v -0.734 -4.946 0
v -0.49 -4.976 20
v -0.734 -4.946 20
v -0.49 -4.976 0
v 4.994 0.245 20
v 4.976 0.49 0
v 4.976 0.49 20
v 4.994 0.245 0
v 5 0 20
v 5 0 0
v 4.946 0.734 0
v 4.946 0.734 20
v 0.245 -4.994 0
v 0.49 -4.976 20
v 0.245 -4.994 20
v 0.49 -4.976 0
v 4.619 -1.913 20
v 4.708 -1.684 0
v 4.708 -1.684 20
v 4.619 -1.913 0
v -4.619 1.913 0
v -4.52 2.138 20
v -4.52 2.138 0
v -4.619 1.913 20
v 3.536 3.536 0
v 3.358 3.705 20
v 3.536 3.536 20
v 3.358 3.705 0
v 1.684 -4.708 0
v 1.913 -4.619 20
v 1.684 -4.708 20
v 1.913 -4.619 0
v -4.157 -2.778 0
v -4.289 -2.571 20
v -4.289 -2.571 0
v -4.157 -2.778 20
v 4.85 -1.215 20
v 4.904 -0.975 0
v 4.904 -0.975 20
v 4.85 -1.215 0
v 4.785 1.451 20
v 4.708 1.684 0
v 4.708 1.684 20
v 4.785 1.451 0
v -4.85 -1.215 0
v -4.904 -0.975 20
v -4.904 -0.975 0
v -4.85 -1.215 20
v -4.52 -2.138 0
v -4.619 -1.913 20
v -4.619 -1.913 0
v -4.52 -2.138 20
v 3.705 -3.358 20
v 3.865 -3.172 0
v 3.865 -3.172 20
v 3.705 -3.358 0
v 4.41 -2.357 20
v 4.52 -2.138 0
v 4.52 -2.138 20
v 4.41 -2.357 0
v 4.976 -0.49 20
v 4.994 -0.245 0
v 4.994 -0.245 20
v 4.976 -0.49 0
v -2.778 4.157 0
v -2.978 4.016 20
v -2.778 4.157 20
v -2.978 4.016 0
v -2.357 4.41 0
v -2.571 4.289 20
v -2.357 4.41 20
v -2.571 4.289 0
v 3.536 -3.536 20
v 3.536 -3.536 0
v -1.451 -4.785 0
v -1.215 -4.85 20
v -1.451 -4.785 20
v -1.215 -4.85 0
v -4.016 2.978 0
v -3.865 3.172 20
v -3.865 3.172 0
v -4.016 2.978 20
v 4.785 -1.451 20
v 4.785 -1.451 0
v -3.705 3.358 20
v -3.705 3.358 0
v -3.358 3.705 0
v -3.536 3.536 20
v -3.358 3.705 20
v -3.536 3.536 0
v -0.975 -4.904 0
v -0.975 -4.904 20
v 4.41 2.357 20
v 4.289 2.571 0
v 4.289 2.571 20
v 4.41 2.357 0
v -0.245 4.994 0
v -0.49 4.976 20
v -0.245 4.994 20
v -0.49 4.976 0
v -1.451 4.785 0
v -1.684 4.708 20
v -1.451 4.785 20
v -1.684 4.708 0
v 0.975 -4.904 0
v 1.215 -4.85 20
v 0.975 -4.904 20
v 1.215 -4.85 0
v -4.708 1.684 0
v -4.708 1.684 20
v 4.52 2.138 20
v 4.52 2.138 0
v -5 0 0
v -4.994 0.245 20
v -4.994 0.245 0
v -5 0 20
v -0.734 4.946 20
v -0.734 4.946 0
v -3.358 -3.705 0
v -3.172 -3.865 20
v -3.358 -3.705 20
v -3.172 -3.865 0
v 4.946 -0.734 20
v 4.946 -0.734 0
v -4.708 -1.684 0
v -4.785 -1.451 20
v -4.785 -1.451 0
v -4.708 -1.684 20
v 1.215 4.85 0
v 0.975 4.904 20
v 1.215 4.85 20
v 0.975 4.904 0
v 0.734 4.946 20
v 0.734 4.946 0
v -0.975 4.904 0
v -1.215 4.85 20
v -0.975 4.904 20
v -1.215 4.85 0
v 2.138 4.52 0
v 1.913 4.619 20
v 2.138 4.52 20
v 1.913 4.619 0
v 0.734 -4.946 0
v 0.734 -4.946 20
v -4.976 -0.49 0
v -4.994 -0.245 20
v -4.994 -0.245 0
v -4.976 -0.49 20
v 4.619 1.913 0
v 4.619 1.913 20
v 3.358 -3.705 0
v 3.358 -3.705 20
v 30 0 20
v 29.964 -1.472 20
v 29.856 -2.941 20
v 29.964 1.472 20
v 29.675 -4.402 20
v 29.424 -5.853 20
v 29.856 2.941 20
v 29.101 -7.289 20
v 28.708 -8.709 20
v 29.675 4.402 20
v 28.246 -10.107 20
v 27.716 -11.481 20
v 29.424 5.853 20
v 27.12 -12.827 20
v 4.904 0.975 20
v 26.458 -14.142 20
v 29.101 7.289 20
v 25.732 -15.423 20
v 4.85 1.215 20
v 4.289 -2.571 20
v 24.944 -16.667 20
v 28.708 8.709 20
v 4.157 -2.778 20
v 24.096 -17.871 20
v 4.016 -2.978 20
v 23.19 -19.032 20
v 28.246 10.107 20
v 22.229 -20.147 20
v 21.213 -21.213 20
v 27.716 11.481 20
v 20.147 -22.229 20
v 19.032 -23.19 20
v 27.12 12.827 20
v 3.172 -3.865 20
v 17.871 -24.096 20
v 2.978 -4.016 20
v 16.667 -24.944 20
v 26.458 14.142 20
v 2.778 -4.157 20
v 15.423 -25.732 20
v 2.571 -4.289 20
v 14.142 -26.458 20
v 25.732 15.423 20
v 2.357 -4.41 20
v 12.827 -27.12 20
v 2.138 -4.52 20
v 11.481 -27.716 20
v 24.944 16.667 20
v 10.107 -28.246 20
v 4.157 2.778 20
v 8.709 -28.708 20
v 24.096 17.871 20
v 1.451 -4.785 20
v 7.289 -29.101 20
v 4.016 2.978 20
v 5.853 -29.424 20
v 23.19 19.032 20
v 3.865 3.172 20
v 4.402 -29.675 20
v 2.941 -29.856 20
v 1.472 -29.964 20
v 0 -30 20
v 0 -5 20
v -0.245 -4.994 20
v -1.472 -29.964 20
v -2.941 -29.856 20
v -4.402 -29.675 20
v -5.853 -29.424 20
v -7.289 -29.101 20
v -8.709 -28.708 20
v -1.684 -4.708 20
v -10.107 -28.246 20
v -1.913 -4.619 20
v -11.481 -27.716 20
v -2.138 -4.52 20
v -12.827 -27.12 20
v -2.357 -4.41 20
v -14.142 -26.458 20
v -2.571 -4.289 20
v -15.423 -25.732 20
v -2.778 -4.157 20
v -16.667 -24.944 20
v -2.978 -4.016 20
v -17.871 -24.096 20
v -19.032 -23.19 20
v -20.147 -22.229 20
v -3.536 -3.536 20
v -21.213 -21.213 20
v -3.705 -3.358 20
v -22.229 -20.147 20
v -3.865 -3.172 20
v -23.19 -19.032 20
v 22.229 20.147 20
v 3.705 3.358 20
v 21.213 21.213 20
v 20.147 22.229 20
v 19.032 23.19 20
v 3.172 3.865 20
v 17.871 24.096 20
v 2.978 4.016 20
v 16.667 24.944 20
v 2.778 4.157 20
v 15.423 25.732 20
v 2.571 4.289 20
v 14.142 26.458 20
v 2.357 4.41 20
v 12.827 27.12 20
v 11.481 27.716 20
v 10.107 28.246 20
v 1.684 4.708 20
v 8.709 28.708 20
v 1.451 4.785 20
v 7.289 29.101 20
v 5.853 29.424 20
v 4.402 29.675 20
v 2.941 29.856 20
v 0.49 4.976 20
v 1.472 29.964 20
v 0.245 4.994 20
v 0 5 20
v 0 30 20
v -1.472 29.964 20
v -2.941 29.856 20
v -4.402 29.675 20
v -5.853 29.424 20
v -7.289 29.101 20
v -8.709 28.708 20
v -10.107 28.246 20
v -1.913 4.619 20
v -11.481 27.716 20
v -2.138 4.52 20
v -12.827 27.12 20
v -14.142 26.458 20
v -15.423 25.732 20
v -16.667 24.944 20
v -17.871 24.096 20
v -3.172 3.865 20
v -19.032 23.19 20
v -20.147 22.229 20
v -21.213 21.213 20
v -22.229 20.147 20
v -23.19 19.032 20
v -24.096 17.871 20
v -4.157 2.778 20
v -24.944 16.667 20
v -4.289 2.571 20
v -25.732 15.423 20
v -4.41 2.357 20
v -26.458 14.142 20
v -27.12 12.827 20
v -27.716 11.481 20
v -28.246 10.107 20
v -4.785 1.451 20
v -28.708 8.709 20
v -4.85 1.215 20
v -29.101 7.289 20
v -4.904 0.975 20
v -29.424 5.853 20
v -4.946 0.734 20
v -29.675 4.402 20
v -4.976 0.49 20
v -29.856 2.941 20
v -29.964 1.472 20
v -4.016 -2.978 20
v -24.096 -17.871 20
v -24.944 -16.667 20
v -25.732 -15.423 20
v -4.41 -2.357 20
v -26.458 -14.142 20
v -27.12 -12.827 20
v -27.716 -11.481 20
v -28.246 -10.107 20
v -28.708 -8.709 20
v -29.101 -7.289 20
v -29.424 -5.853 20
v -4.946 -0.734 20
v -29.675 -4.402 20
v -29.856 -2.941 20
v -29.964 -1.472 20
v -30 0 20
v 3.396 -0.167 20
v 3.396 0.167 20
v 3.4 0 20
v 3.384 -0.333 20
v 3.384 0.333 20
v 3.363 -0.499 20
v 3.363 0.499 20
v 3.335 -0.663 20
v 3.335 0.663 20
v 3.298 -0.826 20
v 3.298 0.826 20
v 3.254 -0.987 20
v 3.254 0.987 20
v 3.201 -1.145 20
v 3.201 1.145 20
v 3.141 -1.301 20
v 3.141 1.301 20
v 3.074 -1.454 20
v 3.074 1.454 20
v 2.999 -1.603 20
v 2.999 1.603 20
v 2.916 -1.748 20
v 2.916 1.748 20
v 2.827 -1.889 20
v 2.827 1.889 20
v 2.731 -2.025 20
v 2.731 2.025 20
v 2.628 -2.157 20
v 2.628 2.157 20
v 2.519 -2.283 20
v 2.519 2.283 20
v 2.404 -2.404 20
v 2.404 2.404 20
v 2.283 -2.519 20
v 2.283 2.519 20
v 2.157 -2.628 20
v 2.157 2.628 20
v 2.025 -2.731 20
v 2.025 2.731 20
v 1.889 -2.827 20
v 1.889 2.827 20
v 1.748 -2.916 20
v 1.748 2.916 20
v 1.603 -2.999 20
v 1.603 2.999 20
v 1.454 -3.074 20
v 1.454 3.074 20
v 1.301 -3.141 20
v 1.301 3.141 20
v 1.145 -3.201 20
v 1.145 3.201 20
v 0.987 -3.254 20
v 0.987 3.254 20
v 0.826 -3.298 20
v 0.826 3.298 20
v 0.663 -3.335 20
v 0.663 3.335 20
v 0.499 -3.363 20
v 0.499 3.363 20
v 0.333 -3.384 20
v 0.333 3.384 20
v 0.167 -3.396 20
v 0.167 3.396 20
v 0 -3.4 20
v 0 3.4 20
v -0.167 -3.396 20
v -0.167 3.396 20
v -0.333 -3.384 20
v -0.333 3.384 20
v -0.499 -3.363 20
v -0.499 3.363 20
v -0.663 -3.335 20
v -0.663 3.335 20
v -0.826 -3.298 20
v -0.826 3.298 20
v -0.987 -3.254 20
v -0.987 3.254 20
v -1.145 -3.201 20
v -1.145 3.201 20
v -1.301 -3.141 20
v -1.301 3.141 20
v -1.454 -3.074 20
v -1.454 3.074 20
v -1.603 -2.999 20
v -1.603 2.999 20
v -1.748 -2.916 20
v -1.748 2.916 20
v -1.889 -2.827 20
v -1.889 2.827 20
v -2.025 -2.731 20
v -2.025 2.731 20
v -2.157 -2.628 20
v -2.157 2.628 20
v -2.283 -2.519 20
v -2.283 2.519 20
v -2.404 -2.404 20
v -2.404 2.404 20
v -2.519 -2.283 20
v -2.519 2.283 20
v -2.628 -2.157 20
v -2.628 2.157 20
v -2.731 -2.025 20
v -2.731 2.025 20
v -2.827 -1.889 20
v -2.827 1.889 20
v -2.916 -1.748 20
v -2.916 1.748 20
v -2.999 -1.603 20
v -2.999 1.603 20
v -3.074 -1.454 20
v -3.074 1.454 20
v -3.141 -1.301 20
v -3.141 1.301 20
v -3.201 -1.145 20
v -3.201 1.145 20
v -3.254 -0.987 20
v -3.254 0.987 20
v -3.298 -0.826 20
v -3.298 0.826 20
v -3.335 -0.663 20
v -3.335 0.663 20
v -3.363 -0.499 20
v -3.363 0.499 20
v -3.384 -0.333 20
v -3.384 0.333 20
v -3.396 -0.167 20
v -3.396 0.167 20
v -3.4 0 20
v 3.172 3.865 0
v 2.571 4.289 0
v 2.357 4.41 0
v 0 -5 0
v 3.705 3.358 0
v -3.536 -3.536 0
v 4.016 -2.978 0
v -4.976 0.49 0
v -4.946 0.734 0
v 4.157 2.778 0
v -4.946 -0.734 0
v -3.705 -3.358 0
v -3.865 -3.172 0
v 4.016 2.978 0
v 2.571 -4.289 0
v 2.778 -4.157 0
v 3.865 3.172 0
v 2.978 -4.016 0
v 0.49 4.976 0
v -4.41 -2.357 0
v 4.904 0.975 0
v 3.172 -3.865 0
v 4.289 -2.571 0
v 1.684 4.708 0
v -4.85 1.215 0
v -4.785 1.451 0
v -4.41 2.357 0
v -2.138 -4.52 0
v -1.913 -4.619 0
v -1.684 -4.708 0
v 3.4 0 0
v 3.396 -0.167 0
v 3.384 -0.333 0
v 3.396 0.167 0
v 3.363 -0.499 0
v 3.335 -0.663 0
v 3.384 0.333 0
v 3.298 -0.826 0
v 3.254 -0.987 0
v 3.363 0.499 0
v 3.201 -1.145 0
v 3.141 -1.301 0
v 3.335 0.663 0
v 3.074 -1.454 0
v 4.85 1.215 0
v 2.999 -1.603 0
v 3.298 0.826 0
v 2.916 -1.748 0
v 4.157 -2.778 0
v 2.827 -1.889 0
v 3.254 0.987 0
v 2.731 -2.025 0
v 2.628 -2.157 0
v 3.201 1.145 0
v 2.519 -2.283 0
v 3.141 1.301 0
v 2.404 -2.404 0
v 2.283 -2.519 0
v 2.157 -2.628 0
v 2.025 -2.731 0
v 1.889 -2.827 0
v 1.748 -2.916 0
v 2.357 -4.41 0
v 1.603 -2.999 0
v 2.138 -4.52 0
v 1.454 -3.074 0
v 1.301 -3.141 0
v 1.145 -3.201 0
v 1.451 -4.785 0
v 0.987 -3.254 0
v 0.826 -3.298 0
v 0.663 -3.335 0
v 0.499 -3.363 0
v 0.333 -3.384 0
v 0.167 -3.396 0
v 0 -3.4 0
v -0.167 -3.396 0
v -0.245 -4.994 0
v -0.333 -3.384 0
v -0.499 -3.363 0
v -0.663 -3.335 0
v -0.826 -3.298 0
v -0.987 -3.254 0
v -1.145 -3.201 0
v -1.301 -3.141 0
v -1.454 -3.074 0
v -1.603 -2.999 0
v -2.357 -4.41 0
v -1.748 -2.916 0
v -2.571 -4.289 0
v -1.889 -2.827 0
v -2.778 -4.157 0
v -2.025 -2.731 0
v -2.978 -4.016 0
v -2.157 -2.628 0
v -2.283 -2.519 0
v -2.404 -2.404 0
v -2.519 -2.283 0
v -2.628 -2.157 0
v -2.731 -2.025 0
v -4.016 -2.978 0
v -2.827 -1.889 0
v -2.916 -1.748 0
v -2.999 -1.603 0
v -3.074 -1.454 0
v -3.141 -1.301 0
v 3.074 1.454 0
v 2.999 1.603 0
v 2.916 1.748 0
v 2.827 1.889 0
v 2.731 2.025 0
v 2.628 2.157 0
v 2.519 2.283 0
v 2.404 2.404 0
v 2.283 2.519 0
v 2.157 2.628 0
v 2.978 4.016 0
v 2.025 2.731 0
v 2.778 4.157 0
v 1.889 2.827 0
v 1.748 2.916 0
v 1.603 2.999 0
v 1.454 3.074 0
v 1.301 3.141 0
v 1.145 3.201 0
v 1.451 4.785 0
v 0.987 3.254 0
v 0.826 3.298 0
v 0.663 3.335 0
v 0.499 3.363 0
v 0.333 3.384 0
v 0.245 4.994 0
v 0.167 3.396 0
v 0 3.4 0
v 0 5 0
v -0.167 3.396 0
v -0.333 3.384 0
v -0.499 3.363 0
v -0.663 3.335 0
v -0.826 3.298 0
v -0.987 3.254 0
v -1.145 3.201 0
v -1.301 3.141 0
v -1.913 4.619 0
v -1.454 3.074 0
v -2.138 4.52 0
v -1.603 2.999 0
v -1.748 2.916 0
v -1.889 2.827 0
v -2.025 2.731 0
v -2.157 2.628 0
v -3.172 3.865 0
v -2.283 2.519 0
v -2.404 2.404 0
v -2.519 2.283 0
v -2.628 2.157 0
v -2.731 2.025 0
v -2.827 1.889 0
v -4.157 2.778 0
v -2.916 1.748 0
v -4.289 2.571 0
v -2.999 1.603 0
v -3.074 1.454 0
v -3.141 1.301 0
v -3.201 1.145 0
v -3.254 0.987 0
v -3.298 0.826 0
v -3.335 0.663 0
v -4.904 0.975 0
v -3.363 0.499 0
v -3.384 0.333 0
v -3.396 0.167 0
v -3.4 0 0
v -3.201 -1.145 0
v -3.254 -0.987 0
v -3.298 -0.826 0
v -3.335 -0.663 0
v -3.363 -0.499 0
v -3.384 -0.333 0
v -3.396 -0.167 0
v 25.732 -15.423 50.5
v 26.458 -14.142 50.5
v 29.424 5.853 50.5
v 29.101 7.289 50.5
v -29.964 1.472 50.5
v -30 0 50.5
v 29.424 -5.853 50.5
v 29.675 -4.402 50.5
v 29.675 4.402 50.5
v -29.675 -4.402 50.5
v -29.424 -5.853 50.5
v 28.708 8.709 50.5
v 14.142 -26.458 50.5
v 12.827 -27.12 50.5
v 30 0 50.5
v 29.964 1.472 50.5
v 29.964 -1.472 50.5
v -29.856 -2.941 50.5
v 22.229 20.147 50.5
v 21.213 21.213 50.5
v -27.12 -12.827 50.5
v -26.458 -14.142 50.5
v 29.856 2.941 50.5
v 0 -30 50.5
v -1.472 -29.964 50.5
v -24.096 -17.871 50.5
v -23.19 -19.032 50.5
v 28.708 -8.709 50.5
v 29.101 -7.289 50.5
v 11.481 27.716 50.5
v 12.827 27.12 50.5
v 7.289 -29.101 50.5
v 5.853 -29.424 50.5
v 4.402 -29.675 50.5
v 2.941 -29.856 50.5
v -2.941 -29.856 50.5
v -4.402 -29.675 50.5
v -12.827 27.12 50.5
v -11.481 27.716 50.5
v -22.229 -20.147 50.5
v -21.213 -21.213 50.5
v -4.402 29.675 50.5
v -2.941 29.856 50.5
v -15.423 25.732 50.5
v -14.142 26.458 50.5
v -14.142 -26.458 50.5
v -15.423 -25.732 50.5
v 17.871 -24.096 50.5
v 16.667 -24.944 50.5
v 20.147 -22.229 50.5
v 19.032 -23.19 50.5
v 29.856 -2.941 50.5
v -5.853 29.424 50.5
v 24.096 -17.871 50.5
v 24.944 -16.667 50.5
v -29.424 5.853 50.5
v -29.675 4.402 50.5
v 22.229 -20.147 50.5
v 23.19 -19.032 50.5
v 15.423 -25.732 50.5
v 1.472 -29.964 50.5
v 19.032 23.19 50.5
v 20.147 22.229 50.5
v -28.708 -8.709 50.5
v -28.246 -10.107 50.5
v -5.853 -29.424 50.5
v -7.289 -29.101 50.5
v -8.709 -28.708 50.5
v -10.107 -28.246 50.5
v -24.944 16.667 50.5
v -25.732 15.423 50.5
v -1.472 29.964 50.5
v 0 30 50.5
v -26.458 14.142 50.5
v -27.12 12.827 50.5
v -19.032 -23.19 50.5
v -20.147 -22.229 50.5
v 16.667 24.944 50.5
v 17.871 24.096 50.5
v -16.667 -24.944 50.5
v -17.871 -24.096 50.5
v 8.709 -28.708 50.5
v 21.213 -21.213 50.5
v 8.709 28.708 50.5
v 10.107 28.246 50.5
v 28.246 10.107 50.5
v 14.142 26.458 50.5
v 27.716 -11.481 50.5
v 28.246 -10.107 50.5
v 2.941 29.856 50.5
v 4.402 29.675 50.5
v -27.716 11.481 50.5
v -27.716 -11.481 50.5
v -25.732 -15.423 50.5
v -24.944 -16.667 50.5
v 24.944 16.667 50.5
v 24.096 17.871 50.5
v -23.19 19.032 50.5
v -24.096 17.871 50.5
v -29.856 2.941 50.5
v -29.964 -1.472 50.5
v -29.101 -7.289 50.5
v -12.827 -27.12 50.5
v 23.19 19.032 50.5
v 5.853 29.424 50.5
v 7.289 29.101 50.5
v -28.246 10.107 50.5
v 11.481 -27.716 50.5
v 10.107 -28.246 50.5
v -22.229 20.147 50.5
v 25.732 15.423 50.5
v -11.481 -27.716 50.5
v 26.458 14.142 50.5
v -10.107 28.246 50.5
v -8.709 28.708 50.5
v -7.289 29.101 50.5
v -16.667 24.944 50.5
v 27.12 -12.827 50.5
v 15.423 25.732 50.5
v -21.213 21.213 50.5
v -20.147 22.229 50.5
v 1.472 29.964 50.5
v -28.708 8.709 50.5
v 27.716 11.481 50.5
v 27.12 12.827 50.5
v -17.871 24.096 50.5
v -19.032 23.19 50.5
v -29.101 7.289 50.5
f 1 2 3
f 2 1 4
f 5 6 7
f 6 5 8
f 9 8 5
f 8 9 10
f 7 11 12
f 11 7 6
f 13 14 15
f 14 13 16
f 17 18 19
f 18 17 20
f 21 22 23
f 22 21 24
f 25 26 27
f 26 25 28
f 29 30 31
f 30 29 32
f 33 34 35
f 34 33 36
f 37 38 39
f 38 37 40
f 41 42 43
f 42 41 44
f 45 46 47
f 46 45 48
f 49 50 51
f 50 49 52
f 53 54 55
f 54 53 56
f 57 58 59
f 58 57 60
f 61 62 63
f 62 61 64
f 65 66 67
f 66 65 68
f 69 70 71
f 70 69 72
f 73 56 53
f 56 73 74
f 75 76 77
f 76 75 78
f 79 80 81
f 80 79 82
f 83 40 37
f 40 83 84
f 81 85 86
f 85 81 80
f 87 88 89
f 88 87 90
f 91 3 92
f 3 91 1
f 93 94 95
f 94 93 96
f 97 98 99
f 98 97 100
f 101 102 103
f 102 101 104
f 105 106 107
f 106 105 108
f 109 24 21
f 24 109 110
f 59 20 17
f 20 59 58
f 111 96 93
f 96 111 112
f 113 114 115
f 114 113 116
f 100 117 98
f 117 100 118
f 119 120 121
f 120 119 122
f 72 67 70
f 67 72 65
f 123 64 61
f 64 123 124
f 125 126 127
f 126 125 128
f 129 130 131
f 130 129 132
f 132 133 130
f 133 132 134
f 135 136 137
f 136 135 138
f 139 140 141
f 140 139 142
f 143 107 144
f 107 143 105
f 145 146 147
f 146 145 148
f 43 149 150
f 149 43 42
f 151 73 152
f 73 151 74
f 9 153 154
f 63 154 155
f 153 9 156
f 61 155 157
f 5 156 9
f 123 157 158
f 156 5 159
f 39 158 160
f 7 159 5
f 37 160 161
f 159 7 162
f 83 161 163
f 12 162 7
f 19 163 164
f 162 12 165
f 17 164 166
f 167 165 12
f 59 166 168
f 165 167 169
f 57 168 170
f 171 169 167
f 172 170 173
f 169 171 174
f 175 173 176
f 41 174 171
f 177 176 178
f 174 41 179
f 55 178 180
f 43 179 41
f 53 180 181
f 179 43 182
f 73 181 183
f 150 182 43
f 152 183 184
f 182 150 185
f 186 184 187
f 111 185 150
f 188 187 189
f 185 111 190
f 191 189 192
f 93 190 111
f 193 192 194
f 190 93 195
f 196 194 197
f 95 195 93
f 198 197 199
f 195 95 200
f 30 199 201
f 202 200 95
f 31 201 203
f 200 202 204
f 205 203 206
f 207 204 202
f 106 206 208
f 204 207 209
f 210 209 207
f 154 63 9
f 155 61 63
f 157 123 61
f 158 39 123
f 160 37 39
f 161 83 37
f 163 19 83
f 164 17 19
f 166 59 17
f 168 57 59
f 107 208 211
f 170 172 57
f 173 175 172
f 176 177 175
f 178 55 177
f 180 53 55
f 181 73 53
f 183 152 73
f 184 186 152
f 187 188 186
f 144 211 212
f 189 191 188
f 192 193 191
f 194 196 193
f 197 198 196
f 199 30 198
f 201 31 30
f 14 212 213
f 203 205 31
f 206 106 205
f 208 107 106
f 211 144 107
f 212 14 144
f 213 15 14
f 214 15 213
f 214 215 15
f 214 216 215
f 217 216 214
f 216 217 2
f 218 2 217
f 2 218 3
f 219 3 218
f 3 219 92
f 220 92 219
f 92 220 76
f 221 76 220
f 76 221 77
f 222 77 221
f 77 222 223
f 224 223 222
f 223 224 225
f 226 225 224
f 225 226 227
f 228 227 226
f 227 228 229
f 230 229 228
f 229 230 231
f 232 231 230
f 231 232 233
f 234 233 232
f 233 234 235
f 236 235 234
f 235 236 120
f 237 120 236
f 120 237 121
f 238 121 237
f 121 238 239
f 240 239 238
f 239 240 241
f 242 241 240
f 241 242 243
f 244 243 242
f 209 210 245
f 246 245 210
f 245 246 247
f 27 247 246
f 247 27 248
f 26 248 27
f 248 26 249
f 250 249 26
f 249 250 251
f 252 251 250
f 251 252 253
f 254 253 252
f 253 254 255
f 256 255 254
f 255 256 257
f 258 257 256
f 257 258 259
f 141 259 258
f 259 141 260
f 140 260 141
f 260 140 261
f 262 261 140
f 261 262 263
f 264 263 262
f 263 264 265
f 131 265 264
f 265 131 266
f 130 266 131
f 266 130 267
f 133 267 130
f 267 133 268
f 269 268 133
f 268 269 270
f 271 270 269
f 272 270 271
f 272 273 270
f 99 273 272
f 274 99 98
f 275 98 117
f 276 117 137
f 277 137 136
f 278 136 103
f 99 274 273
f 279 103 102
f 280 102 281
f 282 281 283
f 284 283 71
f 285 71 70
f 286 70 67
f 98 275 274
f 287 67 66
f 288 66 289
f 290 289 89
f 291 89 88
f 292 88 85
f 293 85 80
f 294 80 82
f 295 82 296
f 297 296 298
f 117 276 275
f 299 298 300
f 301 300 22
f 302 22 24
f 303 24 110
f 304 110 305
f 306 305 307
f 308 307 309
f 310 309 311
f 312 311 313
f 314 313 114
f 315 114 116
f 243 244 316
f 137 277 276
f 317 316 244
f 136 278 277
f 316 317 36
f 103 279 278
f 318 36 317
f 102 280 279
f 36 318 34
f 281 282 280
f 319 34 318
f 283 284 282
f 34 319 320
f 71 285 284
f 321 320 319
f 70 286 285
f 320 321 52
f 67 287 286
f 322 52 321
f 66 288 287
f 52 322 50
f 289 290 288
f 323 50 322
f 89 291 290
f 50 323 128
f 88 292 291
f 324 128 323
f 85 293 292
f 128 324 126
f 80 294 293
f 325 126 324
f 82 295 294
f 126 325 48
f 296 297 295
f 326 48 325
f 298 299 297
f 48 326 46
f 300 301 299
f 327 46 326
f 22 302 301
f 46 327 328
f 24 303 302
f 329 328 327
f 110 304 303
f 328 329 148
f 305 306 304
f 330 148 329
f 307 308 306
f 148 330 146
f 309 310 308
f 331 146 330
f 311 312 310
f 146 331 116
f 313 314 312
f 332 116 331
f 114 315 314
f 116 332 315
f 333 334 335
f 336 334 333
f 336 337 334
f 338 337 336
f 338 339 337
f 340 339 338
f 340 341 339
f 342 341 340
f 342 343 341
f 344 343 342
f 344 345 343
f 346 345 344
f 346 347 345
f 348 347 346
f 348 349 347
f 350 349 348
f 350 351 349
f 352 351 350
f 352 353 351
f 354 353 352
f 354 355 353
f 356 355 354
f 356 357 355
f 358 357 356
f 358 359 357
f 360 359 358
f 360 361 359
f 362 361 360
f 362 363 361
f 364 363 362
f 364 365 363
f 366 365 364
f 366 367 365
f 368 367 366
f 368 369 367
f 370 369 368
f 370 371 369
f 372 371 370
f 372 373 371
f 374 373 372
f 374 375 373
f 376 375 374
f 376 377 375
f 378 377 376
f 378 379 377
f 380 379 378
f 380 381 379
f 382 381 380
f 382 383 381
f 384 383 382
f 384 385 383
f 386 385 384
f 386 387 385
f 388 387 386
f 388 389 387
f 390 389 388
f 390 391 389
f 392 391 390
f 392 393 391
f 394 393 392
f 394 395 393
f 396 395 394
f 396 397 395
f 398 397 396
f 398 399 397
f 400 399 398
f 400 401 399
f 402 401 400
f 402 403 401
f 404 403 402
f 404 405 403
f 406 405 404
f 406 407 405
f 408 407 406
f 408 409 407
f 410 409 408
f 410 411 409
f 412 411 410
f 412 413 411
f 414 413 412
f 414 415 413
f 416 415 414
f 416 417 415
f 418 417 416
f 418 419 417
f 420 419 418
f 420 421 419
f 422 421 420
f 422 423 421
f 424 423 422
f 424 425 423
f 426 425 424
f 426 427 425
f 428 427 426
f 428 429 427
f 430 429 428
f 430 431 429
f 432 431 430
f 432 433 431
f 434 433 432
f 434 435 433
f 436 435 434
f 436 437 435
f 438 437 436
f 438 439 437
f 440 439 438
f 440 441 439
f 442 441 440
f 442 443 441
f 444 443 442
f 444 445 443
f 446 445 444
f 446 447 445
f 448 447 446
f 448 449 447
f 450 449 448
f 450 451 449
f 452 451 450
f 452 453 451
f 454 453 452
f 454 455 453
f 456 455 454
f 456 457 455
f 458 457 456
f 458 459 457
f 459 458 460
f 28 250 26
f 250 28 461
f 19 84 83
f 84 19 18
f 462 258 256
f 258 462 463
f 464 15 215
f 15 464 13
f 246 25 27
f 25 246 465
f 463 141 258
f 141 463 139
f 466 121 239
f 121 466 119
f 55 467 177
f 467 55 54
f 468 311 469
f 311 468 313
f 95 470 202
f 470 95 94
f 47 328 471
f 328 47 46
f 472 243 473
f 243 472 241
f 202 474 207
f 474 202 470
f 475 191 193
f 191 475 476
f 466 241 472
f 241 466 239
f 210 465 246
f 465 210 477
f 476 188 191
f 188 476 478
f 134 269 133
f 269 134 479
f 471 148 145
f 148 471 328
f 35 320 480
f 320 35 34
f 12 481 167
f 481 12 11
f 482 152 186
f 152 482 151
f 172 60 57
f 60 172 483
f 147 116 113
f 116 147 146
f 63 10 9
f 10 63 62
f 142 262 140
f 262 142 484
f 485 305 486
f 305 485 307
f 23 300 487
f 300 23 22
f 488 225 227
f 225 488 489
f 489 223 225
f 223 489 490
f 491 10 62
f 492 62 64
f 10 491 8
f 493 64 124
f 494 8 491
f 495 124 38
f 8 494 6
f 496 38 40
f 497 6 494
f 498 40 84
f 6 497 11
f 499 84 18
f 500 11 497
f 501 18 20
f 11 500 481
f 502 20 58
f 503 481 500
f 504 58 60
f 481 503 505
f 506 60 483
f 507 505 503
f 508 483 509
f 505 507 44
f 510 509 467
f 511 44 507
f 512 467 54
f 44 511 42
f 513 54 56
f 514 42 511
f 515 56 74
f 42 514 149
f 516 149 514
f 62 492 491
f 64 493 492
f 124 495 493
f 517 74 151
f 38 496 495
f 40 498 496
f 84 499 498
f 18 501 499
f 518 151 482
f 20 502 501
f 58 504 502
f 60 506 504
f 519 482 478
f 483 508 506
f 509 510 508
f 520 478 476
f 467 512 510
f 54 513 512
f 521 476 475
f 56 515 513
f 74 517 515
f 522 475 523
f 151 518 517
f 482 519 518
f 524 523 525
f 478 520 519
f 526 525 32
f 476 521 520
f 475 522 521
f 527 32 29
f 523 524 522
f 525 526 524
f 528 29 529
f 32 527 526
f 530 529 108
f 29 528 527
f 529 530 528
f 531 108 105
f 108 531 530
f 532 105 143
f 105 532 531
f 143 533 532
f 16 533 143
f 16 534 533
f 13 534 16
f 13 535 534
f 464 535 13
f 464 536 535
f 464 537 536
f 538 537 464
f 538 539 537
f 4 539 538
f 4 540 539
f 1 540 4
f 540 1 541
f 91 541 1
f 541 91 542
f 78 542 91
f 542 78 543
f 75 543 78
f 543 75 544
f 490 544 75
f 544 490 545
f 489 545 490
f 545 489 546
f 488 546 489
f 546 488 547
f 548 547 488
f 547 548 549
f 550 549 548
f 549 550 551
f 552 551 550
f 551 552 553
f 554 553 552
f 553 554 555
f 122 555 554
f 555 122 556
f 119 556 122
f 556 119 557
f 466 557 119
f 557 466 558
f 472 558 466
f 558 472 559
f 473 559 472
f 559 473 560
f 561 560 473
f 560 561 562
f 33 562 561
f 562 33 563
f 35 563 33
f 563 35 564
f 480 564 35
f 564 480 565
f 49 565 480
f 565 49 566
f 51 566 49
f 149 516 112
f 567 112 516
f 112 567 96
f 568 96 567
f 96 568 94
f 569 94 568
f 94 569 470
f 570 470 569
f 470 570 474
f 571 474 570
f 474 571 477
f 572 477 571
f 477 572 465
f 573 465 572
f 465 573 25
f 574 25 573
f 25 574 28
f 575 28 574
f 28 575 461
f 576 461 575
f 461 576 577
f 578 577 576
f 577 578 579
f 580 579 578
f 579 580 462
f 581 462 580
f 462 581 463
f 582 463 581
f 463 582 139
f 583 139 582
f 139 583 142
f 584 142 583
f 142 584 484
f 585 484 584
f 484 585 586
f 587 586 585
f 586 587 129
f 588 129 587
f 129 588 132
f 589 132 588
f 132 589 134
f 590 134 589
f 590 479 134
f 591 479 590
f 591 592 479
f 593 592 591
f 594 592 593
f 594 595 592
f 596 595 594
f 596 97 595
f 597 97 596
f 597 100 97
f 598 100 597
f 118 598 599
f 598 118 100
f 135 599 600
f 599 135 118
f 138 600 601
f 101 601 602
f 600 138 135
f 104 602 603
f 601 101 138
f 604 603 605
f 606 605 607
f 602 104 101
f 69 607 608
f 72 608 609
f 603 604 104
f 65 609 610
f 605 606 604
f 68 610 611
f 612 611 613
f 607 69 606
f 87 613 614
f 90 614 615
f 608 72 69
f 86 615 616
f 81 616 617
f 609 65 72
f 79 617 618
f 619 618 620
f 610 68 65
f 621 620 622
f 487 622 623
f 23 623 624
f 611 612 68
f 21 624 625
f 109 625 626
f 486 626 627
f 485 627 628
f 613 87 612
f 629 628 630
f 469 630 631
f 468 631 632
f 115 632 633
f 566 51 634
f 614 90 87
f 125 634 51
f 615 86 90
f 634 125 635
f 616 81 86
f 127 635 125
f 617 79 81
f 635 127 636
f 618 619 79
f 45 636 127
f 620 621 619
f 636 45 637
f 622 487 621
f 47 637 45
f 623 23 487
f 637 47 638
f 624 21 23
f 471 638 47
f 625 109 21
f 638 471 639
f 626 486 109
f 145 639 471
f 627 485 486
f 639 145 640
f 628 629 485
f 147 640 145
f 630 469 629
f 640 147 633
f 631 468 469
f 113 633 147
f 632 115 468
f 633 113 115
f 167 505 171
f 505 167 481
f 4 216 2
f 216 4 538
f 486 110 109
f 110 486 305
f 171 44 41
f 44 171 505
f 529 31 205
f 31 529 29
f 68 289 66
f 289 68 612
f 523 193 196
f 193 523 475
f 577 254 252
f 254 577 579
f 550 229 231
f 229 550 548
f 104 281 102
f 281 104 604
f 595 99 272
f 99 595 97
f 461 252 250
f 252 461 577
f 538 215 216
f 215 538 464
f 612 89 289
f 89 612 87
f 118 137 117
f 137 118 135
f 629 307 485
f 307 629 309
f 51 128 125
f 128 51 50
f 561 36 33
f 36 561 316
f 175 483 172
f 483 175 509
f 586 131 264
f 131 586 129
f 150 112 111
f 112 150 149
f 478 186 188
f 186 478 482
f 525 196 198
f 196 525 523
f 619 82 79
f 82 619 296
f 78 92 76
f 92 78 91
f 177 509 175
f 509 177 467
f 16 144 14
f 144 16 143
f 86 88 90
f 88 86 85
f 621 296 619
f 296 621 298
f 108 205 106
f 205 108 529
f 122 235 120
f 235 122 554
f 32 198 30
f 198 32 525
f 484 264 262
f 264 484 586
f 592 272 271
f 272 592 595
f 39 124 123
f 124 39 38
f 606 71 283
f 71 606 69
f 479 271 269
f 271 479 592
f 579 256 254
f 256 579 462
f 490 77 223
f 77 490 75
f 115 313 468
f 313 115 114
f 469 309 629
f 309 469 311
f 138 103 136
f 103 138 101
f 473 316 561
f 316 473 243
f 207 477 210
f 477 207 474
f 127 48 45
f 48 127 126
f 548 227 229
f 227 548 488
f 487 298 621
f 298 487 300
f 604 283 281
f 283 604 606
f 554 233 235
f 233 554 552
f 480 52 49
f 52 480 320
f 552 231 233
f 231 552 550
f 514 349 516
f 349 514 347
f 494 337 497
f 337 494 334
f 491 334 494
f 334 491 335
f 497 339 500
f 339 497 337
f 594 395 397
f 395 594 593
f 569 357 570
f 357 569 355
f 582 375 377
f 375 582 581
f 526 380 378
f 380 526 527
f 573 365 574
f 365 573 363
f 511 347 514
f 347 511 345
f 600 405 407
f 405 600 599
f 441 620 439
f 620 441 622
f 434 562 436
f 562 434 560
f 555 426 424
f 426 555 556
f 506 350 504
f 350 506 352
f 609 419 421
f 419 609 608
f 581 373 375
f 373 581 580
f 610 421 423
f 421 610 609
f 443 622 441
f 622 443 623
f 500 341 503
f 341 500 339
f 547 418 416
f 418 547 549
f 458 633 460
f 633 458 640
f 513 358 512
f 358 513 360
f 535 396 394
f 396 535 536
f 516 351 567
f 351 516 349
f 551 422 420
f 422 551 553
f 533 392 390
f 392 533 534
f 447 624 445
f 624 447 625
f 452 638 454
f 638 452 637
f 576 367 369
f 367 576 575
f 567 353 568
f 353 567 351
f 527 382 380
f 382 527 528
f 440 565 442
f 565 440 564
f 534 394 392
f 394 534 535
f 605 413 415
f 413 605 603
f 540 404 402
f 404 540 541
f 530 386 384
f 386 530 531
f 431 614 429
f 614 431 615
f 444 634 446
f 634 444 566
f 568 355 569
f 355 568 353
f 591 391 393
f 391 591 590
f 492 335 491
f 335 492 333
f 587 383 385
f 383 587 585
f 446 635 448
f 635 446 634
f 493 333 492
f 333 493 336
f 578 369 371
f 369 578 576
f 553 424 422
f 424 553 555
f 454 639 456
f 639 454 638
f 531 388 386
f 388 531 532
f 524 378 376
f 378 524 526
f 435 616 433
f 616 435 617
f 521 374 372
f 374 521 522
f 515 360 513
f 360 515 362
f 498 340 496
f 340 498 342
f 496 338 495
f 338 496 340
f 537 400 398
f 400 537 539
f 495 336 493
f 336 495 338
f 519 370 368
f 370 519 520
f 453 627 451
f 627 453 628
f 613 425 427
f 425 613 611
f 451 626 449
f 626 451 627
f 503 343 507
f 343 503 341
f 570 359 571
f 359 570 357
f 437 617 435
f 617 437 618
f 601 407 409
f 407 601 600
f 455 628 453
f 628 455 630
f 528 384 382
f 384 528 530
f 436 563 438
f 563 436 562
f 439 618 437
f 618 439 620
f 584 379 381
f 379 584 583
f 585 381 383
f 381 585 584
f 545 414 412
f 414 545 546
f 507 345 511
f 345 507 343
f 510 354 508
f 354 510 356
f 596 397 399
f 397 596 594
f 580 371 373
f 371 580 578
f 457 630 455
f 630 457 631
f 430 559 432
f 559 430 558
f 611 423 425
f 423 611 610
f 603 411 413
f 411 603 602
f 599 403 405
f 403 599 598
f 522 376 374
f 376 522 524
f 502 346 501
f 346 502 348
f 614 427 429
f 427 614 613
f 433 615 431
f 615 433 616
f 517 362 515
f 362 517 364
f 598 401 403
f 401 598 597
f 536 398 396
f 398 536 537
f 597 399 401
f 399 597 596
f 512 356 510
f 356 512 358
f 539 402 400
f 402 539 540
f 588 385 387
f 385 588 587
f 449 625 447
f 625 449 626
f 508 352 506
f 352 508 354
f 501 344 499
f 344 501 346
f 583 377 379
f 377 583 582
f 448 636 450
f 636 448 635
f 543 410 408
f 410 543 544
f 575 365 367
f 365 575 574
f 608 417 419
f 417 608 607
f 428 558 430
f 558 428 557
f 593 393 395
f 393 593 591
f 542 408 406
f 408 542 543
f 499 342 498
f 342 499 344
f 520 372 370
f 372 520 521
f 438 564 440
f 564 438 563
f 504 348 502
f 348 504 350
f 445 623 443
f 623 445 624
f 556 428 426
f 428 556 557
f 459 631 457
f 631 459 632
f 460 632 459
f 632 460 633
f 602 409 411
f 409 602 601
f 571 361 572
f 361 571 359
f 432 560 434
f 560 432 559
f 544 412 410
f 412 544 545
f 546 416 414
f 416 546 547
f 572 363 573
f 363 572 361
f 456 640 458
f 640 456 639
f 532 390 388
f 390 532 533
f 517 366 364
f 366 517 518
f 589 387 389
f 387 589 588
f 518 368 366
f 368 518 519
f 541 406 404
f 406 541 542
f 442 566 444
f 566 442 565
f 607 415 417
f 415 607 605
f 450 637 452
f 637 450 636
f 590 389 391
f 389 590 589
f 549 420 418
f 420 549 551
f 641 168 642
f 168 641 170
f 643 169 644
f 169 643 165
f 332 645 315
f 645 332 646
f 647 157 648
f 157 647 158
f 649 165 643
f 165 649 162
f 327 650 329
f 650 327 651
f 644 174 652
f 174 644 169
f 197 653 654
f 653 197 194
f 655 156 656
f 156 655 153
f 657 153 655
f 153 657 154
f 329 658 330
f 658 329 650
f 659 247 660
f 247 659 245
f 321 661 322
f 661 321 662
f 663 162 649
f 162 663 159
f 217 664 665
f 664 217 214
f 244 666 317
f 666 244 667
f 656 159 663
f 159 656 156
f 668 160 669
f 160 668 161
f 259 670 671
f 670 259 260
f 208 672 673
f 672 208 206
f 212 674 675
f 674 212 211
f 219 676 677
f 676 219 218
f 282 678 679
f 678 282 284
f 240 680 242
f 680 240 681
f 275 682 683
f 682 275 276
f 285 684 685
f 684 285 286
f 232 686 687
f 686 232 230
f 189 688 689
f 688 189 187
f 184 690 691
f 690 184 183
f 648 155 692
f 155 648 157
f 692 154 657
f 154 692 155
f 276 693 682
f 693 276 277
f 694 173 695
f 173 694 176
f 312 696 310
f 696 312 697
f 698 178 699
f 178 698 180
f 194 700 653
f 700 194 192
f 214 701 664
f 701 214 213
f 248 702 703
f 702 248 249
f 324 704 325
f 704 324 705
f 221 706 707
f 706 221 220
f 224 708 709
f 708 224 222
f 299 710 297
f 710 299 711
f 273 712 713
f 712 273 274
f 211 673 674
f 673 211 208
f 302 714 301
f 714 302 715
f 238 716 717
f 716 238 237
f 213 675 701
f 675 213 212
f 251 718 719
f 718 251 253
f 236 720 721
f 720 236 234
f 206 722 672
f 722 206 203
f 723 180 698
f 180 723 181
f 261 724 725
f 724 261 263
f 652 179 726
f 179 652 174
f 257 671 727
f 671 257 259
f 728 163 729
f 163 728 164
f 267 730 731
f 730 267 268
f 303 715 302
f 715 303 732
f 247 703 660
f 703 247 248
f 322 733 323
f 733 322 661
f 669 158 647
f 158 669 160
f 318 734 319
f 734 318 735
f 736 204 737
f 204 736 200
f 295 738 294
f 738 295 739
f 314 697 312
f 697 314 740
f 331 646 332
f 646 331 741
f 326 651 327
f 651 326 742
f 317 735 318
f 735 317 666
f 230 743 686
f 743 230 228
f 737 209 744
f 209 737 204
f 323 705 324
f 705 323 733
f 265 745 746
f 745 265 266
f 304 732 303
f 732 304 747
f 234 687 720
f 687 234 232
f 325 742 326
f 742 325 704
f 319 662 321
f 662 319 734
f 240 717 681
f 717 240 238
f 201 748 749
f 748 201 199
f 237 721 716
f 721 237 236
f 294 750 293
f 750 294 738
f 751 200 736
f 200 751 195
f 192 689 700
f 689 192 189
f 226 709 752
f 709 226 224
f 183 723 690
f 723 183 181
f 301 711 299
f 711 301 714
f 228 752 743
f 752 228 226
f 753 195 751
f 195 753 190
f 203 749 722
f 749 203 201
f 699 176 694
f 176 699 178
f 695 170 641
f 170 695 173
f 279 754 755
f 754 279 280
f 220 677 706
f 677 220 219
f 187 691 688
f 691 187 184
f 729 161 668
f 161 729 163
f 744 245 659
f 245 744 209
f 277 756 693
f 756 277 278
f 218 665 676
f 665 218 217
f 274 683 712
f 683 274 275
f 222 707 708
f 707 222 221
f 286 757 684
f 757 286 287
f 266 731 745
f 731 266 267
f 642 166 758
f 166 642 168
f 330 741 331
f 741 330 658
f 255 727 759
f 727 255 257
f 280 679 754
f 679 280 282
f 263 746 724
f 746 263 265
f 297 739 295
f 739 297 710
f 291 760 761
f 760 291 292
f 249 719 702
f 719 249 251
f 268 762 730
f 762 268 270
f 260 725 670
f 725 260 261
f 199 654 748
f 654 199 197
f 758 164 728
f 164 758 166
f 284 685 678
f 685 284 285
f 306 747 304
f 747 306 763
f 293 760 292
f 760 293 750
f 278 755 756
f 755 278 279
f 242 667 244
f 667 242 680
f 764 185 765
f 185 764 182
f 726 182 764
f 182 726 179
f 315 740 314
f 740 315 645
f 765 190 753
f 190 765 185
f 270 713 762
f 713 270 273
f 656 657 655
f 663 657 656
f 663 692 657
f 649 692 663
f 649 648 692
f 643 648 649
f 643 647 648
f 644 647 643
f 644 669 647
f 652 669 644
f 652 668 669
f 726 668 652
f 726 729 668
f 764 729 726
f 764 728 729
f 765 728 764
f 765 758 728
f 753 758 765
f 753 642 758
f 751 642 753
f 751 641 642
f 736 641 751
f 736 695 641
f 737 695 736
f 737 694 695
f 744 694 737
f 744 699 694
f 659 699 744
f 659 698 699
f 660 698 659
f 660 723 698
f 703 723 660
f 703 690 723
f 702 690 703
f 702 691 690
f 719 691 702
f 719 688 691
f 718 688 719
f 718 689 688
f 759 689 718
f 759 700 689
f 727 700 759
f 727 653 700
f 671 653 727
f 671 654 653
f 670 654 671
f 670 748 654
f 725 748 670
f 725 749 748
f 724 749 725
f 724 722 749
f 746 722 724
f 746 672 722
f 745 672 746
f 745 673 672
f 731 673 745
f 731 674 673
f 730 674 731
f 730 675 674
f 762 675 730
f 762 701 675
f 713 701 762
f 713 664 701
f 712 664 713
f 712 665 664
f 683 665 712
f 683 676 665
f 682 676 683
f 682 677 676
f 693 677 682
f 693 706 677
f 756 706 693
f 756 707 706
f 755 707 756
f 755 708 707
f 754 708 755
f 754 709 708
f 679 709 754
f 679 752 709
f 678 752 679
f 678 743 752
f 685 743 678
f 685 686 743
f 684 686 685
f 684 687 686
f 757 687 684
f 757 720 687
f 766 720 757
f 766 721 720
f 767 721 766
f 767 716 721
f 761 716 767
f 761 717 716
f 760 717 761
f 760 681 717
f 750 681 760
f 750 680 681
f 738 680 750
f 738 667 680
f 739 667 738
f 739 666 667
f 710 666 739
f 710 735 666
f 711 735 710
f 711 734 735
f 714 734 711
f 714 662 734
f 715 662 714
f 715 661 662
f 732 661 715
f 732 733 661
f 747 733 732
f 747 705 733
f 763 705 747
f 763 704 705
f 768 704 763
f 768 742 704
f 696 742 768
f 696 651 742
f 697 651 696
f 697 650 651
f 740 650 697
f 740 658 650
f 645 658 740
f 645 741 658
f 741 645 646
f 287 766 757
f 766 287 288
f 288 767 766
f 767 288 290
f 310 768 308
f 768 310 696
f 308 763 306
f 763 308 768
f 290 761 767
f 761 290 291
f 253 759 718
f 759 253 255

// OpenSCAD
// Small lab funnel - printed upright, open top and bottom
// Units: mm. One complete part, no external libraries.

// ---- Parameters ----
spout_od      = 10;    // spout outer diameter
spout_length  = 20;    // spout runs from z = 0 to z = 20
cone_bottom_d = 10;    // cone outer diameter at z = 20 (spout top)
cone_top_d    = 60;    // cone outer diameter at rim, z = 50
wall          = 1.6;   // uniform wall thickness
eps           = 0.5;   // cutter overshoot past faces

$fn = 128;             // smoothness of curved surfaces

// ---- Derived ----
spout_id = spout_od - 2 * wall;   // bore of spout (6.8 mm)
cone_h   = 50 - 20;               // cone height (30 mm)

// ---- Model ----
union() {
    // Spout: straight tube from z = 0 to z = 20
    difference() {
        cylinder(d = spout_od, h = spout_length);
        translate([0, 0, -eps])
            cylinder(d = spout_id, h = spout_length + 2 * eps);
    }

    // Cone: widens from 10 mm at z = 20 to 60 mm at z = 50
    translate([0, 0, 20])
        linear_extrude(height = cone_h)
            circle(d = cone_bottom_d + 2 * wall);   // inner curve at bottom
    translate([0, 0, 20])
        linear_extrude(height = cone_h + eps)
            circle(d = cone_top_d);                 // outer rim at top
}
